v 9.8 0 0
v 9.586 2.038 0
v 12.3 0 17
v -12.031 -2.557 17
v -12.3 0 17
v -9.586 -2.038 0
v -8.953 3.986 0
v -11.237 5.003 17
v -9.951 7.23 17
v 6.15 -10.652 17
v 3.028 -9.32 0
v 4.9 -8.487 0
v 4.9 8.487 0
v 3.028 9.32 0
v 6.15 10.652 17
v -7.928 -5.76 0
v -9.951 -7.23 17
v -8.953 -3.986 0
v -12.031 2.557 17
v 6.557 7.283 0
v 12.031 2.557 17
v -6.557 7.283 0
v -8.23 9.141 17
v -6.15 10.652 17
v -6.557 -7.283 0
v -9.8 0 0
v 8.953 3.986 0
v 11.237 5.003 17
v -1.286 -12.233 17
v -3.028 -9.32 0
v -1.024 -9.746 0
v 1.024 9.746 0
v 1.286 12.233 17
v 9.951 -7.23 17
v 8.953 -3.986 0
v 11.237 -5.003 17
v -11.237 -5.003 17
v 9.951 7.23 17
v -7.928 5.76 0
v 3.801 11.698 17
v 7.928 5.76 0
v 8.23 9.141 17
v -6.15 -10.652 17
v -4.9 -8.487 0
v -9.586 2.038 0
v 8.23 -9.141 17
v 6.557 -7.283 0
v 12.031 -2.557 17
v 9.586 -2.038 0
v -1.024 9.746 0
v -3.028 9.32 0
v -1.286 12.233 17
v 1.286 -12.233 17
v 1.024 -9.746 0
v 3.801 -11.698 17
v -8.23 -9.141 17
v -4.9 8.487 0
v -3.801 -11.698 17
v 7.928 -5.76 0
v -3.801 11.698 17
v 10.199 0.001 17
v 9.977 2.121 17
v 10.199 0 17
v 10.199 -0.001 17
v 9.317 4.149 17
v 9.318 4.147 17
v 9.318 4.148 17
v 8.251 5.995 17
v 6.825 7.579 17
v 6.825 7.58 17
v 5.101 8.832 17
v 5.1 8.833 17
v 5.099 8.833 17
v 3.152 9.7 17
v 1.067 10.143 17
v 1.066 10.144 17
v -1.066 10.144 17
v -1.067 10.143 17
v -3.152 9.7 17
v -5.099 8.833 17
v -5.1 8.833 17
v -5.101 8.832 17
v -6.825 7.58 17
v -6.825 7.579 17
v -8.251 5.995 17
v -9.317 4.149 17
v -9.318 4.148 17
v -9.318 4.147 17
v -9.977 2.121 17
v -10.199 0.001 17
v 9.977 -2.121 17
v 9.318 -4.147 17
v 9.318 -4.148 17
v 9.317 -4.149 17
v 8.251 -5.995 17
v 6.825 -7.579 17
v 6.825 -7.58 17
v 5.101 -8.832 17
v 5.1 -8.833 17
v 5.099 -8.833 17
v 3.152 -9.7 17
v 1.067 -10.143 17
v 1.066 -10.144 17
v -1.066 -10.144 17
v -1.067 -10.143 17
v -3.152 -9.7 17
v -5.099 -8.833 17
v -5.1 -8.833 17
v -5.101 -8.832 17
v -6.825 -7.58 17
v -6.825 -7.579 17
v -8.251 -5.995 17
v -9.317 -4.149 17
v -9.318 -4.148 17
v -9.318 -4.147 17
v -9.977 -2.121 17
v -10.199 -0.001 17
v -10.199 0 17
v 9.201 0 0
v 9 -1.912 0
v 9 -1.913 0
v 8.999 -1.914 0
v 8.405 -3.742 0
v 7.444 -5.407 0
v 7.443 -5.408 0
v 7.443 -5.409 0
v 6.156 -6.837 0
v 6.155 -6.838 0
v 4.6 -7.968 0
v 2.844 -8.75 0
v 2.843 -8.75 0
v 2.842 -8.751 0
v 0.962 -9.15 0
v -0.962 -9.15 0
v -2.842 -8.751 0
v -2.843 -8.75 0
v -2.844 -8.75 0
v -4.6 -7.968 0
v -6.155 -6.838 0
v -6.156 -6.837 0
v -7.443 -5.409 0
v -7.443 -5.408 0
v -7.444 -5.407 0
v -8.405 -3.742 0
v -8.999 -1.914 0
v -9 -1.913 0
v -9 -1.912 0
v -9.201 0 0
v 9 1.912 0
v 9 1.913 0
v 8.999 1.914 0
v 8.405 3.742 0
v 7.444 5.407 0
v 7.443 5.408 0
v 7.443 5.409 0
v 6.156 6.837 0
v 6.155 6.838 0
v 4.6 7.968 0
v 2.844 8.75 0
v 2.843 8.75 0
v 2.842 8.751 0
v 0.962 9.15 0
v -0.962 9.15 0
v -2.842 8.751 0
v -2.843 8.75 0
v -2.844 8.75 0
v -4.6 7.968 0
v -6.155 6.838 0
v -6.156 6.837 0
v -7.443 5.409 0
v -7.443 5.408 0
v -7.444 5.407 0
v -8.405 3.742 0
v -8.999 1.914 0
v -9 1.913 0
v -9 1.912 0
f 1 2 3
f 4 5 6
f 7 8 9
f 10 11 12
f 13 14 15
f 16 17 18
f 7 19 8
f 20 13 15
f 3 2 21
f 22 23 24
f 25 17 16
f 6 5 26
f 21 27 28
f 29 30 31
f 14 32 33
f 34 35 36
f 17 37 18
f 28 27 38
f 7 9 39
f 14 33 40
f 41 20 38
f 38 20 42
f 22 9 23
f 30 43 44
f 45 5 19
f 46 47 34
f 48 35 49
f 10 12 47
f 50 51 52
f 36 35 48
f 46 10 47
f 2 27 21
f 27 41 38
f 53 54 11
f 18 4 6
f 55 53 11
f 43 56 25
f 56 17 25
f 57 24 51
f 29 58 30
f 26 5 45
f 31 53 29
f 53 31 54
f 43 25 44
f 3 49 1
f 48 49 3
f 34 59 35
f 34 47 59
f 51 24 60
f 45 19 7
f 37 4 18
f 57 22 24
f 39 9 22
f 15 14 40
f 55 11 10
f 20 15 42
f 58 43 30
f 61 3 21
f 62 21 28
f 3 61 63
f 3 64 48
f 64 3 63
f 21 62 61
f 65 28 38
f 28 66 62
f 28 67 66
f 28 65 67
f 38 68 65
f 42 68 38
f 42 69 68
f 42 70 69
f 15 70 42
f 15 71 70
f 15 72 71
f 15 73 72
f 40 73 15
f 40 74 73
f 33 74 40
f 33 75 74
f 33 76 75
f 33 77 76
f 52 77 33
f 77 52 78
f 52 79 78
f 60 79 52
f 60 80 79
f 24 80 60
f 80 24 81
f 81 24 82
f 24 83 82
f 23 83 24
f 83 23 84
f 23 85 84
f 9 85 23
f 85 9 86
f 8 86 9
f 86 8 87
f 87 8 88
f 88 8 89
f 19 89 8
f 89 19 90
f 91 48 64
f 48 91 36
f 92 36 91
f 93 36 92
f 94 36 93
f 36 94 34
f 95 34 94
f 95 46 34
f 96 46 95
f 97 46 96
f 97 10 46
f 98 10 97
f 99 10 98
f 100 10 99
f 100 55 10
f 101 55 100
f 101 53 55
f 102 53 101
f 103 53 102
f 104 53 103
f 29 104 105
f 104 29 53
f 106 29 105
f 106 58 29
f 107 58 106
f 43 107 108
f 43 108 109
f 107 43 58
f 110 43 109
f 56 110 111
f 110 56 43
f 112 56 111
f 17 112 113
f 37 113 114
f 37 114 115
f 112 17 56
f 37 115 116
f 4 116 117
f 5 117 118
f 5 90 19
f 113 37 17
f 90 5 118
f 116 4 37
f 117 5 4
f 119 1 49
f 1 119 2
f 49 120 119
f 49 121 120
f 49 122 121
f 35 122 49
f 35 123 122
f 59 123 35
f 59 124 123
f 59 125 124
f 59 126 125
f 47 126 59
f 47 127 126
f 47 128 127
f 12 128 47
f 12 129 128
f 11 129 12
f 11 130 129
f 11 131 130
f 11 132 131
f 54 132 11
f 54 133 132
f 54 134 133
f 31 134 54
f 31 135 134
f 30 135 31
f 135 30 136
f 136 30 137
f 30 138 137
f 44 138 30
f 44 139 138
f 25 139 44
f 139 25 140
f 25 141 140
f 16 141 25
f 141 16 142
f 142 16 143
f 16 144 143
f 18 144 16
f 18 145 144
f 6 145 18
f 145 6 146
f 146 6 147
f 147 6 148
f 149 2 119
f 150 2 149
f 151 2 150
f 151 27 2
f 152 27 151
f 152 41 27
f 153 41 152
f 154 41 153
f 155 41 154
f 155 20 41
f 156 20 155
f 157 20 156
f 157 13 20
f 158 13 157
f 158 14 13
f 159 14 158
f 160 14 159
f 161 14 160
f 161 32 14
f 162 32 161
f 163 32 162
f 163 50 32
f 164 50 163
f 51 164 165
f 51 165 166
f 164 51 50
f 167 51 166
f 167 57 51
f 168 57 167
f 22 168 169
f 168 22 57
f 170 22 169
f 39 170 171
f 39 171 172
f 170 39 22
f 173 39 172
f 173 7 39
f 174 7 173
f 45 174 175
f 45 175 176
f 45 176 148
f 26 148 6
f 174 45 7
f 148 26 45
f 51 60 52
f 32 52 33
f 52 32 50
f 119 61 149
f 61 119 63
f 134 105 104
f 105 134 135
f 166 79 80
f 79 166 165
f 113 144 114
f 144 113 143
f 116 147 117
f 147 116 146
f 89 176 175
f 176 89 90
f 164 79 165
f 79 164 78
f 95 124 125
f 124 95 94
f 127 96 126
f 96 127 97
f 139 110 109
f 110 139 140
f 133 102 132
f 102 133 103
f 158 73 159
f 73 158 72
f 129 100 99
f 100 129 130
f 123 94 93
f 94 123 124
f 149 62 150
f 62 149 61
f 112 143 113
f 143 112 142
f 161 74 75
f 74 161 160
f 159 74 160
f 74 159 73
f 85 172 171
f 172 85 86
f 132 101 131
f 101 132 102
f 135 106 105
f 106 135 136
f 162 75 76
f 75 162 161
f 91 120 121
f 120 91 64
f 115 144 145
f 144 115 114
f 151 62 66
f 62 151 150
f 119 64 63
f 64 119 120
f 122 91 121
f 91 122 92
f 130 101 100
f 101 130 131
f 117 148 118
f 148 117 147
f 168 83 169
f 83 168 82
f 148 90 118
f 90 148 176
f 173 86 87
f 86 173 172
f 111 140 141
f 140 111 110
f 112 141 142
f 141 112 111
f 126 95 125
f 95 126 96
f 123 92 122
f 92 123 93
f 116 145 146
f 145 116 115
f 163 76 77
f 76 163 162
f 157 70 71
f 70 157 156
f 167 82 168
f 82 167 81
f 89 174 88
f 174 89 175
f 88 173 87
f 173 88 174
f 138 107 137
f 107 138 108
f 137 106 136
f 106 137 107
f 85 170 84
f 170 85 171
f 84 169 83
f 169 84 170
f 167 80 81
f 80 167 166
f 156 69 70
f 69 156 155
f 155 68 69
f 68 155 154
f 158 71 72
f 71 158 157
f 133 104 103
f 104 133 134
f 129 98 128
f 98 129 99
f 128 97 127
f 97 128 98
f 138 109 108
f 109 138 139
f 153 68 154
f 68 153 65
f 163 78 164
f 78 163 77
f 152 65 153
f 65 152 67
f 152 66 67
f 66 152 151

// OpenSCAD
// Candle adapter
//(c) 2013 Wouter Robers


OuterDiameterTop=25;
OuterDiameterBottom=20;
InnerDiameterTop=20;
InnerDiameterBottom=18;
Height=17;


// Some 3D printers print a little thicker. This parameter compensates for that.
Margin=0.2;

difference(){
union(){
// All the objects
cylinder(r1=OuterDiameterBottom/2-Margin,r2=OuterDiameterTop/2-Margin,h=Height);
}
//All the cut-outs
translate([0,0,-0.01]) cylinder(r1=InnerDiameterBottom/2+Margin,r2=InnerDiameterTop/2+Margin,h=Height+0.02);

}
